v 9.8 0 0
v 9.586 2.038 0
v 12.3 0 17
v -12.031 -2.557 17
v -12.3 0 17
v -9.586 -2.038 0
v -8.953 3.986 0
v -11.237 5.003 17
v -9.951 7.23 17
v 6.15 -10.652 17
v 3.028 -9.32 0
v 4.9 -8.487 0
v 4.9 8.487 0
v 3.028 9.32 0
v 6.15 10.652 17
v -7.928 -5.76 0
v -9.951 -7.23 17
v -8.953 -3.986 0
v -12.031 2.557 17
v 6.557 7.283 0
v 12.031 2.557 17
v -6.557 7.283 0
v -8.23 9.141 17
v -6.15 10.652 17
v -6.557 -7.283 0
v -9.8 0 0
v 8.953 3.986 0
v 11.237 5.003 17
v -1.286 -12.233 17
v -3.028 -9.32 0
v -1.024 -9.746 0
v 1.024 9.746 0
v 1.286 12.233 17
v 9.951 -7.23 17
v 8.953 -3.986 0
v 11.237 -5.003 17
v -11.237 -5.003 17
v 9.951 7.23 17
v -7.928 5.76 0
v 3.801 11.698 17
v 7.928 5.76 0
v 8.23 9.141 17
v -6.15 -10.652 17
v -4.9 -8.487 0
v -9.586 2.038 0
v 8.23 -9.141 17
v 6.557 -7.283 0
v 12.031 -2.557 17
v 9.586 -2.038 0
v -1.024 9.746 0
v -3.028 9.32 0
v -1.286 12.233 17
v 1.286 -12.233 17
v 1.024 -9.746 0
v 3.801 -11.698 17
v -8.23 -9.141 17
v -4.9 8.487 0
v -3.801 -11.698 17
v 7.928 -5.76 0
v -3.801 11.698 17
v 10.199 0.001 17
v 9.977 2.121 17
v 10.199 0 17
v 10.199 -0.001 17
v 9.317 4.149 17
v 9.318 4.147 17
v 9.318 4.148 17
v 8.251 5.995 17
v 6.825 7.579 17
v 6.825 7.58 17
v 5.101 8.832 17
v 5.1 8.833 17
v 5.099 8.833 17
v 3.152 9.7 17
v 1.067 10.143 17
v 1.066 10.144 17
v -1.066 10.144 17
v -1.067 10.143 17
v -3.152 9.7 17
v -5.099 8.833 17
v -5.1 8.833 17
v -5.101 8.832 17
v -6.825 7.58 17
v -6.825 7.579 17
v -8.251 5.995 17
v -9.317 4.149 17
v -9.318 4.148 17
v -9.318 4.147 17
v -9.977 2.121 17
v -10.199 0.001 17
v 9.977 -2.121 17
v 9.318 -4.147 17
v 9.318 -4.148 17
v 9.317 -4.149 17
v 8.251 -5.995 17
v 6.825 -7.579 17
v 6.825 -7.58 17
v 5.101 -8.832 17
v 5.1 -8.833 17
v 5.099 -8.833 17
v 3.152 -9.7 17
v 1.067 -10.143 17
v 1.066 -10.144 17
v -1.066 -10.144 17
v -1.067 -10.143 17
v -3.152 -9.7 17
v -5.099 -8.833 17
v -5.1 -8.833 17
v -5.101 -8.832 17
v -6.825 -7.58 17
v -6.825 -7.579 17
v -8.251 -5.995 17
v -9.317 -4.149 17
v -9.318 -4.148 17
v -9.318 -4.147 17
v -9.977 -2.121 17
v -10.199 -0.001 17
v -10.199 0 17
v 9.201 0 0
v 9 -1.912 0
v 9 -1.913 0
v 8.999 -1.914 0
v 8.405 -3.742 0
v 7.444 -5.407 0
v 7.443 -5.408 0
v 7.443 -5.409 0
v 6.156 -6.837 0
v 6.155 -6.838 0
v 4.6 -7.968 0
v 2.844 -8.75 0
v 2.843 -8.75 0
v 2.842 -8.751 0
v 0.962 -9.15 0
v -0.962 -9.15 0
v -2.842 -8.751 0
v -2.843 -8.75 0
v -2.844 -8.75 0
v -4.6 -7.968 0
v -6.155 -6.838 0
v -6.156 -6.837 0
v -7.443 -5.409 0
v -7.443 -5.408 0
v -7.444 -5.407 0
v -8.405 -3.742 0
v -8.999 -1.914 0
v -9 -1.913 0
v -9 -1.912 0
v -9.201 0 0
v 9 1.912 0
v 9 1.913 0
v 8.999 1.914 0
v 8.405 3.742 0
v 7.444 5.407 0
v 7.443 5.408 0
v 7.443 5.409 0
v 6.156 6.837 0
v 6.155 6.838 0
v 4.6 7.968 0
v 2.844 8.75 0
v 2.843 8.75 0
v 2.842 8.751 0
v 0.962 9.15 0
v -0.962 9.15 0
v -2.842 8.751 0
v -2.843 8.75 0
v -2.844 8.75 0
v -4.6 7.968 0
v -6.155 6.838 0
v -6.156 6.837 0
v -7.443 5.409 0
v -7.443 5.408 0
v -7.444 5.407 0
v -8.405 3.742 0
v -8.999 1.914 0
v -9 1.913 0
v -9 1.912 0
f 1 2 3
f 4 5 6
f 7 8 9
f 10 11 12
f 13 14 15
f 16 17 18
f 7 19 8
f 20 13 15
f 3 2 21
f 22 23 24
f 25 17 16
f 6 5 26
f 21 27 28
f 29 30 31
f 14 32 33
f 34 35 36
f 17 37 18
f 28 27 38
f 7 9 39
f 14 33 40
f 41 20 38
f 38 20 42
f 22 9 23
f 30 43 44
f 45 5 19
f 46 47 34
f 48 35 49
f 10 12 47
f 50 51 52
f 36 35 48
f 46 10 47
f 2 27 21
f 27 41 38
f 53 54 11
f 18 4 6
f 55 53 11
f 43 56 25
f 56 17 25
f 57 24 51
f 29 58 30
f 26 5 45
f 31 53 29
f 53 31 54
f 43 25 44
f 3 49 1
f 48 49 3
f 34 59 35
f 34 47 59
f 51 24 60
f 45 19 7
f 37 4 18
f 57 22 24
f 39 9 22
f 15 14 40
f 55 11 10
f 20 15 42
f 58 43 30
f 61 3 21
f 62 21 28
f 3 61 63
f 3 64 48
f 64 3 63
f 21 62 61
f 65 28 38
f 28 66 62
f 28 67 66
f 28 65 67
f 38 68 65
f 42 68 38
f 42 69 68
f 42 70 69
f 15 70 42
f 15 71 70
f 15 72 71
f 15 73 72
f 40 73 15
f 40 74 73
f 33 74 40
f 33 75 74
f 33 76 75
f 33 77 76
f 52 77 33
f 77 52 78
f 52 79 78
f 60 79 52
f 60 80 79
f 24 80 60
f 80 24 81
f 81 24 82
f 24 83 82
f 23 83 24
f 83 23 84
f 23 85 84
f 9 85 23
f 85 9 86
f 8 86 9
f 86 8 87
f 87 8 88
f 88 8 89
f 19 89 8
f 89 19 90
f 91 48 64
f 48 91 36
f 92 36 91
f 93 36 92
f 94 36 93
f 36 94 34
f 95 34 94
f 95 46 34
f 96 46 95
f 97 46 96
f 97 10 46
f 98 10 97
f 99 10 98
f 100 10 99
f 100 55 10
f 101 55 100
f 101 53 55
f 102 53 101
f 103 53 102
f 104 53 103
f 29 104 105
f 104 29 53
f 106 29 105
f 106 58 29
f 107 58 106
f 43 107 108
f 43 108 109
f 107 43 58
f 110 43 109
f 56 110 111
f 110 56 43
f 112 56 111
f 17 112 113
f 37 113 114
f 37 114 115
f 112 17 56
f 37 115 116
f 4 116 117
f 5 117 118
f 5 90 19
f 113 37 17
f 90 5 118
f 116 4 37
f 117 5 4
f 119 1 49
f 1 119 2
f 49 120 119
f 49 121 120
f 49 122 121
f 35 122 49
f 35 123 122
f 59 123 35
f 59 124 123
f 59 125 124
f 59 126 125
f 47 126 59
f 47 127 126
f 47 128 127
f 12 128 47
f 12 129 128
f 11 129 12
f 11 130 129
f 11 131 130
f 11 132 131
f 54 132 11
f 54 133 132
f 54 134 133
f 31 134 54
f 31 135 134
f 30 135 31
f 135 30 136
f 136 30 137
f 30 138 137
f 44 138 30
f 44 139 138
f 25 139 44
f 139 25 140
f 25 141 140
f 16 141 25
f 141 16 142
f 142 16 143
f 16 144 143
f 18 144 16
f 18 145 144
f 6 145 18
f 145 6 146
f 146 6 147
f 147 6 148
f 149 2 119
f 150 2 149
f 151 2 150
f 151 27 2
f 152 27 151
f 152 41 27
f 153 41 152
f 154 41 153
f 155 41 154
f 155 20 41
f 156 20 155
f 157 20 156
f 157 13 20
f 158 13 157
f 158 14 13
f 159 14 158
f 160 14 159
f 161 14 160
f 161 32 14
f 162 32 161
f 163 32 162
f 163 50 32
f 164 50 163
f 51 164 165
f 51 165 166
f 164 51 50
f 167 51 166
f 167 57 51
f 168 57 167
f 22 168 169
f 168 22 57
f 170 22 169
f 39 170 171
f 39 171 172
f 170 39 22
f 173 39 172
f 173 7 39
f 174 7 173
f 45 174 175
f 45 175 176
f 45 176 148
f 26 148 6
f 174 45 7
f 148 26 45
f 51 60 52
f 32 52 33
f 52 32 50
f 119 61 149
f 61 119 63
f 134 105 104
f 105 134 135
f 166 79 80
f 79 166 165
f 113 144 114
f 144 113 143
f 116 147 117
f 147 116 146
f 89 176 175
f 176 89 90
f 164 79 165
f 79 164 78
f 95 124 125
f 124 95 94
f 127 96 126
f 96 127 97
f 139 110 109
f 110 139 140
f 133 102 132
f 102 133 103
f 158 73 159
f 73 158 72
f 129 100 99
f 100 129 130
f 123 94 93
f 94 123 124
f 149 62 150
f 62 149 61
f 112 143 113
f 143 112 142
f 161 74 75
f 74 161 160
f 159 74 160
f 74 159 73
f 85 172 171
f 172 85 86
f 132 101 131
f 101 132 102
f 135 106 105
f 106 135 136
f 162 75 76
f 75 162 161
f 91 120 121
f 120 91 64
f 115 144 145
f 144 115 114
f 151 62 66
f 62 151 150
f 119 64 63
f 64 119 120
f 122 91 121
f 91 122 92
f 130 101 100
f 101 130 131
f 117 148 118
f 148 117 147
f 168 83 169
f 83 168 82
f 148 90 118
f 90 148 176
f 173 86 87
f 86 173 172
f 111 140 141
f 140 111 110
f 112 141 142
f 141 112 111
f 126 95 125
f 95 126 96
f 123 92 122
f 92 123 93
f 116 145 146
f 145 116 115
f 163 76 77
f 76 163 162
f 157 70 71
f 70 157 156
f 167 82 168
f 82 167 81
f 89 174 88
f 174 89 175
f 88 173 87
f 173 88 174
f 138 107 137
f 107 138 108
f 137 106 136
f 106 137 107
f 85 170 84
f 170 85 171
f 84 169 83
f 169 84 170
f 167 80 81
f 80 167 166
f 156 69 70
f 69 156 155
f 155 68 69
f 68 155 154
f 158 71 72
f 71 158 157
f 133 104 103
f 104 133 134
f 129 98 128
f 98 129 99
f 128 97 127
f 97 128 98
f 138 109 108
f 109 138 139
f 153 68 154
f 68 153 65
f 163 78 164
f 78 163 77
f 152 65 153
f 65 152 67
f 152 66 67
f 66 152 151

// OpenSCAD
// Candle adapter
//(c) 2013 Wouter Robers


OuterDiameterTop=25;
OuterDiameterBottom=20;
InnerDiameterTop=20;
InnerDiameterBottom=18;
Height=17;


// Some 3D printers print a little thicker. This parameter compensates for that.
Margin=0.2;

difference(){
union(){
// All the objects
cylinder(r1=OuterDiameterBottom/2-Margin,r2=OuterDiameterTop/2-Margin,h=Height);
}
//All the cut-outs
translate([0,0,-0.01]) cylinder(r1=InnerDiameterBottom/2+Margin,r2=InnerDiameterTop/2+Margin,h=Height+0.02);

}
